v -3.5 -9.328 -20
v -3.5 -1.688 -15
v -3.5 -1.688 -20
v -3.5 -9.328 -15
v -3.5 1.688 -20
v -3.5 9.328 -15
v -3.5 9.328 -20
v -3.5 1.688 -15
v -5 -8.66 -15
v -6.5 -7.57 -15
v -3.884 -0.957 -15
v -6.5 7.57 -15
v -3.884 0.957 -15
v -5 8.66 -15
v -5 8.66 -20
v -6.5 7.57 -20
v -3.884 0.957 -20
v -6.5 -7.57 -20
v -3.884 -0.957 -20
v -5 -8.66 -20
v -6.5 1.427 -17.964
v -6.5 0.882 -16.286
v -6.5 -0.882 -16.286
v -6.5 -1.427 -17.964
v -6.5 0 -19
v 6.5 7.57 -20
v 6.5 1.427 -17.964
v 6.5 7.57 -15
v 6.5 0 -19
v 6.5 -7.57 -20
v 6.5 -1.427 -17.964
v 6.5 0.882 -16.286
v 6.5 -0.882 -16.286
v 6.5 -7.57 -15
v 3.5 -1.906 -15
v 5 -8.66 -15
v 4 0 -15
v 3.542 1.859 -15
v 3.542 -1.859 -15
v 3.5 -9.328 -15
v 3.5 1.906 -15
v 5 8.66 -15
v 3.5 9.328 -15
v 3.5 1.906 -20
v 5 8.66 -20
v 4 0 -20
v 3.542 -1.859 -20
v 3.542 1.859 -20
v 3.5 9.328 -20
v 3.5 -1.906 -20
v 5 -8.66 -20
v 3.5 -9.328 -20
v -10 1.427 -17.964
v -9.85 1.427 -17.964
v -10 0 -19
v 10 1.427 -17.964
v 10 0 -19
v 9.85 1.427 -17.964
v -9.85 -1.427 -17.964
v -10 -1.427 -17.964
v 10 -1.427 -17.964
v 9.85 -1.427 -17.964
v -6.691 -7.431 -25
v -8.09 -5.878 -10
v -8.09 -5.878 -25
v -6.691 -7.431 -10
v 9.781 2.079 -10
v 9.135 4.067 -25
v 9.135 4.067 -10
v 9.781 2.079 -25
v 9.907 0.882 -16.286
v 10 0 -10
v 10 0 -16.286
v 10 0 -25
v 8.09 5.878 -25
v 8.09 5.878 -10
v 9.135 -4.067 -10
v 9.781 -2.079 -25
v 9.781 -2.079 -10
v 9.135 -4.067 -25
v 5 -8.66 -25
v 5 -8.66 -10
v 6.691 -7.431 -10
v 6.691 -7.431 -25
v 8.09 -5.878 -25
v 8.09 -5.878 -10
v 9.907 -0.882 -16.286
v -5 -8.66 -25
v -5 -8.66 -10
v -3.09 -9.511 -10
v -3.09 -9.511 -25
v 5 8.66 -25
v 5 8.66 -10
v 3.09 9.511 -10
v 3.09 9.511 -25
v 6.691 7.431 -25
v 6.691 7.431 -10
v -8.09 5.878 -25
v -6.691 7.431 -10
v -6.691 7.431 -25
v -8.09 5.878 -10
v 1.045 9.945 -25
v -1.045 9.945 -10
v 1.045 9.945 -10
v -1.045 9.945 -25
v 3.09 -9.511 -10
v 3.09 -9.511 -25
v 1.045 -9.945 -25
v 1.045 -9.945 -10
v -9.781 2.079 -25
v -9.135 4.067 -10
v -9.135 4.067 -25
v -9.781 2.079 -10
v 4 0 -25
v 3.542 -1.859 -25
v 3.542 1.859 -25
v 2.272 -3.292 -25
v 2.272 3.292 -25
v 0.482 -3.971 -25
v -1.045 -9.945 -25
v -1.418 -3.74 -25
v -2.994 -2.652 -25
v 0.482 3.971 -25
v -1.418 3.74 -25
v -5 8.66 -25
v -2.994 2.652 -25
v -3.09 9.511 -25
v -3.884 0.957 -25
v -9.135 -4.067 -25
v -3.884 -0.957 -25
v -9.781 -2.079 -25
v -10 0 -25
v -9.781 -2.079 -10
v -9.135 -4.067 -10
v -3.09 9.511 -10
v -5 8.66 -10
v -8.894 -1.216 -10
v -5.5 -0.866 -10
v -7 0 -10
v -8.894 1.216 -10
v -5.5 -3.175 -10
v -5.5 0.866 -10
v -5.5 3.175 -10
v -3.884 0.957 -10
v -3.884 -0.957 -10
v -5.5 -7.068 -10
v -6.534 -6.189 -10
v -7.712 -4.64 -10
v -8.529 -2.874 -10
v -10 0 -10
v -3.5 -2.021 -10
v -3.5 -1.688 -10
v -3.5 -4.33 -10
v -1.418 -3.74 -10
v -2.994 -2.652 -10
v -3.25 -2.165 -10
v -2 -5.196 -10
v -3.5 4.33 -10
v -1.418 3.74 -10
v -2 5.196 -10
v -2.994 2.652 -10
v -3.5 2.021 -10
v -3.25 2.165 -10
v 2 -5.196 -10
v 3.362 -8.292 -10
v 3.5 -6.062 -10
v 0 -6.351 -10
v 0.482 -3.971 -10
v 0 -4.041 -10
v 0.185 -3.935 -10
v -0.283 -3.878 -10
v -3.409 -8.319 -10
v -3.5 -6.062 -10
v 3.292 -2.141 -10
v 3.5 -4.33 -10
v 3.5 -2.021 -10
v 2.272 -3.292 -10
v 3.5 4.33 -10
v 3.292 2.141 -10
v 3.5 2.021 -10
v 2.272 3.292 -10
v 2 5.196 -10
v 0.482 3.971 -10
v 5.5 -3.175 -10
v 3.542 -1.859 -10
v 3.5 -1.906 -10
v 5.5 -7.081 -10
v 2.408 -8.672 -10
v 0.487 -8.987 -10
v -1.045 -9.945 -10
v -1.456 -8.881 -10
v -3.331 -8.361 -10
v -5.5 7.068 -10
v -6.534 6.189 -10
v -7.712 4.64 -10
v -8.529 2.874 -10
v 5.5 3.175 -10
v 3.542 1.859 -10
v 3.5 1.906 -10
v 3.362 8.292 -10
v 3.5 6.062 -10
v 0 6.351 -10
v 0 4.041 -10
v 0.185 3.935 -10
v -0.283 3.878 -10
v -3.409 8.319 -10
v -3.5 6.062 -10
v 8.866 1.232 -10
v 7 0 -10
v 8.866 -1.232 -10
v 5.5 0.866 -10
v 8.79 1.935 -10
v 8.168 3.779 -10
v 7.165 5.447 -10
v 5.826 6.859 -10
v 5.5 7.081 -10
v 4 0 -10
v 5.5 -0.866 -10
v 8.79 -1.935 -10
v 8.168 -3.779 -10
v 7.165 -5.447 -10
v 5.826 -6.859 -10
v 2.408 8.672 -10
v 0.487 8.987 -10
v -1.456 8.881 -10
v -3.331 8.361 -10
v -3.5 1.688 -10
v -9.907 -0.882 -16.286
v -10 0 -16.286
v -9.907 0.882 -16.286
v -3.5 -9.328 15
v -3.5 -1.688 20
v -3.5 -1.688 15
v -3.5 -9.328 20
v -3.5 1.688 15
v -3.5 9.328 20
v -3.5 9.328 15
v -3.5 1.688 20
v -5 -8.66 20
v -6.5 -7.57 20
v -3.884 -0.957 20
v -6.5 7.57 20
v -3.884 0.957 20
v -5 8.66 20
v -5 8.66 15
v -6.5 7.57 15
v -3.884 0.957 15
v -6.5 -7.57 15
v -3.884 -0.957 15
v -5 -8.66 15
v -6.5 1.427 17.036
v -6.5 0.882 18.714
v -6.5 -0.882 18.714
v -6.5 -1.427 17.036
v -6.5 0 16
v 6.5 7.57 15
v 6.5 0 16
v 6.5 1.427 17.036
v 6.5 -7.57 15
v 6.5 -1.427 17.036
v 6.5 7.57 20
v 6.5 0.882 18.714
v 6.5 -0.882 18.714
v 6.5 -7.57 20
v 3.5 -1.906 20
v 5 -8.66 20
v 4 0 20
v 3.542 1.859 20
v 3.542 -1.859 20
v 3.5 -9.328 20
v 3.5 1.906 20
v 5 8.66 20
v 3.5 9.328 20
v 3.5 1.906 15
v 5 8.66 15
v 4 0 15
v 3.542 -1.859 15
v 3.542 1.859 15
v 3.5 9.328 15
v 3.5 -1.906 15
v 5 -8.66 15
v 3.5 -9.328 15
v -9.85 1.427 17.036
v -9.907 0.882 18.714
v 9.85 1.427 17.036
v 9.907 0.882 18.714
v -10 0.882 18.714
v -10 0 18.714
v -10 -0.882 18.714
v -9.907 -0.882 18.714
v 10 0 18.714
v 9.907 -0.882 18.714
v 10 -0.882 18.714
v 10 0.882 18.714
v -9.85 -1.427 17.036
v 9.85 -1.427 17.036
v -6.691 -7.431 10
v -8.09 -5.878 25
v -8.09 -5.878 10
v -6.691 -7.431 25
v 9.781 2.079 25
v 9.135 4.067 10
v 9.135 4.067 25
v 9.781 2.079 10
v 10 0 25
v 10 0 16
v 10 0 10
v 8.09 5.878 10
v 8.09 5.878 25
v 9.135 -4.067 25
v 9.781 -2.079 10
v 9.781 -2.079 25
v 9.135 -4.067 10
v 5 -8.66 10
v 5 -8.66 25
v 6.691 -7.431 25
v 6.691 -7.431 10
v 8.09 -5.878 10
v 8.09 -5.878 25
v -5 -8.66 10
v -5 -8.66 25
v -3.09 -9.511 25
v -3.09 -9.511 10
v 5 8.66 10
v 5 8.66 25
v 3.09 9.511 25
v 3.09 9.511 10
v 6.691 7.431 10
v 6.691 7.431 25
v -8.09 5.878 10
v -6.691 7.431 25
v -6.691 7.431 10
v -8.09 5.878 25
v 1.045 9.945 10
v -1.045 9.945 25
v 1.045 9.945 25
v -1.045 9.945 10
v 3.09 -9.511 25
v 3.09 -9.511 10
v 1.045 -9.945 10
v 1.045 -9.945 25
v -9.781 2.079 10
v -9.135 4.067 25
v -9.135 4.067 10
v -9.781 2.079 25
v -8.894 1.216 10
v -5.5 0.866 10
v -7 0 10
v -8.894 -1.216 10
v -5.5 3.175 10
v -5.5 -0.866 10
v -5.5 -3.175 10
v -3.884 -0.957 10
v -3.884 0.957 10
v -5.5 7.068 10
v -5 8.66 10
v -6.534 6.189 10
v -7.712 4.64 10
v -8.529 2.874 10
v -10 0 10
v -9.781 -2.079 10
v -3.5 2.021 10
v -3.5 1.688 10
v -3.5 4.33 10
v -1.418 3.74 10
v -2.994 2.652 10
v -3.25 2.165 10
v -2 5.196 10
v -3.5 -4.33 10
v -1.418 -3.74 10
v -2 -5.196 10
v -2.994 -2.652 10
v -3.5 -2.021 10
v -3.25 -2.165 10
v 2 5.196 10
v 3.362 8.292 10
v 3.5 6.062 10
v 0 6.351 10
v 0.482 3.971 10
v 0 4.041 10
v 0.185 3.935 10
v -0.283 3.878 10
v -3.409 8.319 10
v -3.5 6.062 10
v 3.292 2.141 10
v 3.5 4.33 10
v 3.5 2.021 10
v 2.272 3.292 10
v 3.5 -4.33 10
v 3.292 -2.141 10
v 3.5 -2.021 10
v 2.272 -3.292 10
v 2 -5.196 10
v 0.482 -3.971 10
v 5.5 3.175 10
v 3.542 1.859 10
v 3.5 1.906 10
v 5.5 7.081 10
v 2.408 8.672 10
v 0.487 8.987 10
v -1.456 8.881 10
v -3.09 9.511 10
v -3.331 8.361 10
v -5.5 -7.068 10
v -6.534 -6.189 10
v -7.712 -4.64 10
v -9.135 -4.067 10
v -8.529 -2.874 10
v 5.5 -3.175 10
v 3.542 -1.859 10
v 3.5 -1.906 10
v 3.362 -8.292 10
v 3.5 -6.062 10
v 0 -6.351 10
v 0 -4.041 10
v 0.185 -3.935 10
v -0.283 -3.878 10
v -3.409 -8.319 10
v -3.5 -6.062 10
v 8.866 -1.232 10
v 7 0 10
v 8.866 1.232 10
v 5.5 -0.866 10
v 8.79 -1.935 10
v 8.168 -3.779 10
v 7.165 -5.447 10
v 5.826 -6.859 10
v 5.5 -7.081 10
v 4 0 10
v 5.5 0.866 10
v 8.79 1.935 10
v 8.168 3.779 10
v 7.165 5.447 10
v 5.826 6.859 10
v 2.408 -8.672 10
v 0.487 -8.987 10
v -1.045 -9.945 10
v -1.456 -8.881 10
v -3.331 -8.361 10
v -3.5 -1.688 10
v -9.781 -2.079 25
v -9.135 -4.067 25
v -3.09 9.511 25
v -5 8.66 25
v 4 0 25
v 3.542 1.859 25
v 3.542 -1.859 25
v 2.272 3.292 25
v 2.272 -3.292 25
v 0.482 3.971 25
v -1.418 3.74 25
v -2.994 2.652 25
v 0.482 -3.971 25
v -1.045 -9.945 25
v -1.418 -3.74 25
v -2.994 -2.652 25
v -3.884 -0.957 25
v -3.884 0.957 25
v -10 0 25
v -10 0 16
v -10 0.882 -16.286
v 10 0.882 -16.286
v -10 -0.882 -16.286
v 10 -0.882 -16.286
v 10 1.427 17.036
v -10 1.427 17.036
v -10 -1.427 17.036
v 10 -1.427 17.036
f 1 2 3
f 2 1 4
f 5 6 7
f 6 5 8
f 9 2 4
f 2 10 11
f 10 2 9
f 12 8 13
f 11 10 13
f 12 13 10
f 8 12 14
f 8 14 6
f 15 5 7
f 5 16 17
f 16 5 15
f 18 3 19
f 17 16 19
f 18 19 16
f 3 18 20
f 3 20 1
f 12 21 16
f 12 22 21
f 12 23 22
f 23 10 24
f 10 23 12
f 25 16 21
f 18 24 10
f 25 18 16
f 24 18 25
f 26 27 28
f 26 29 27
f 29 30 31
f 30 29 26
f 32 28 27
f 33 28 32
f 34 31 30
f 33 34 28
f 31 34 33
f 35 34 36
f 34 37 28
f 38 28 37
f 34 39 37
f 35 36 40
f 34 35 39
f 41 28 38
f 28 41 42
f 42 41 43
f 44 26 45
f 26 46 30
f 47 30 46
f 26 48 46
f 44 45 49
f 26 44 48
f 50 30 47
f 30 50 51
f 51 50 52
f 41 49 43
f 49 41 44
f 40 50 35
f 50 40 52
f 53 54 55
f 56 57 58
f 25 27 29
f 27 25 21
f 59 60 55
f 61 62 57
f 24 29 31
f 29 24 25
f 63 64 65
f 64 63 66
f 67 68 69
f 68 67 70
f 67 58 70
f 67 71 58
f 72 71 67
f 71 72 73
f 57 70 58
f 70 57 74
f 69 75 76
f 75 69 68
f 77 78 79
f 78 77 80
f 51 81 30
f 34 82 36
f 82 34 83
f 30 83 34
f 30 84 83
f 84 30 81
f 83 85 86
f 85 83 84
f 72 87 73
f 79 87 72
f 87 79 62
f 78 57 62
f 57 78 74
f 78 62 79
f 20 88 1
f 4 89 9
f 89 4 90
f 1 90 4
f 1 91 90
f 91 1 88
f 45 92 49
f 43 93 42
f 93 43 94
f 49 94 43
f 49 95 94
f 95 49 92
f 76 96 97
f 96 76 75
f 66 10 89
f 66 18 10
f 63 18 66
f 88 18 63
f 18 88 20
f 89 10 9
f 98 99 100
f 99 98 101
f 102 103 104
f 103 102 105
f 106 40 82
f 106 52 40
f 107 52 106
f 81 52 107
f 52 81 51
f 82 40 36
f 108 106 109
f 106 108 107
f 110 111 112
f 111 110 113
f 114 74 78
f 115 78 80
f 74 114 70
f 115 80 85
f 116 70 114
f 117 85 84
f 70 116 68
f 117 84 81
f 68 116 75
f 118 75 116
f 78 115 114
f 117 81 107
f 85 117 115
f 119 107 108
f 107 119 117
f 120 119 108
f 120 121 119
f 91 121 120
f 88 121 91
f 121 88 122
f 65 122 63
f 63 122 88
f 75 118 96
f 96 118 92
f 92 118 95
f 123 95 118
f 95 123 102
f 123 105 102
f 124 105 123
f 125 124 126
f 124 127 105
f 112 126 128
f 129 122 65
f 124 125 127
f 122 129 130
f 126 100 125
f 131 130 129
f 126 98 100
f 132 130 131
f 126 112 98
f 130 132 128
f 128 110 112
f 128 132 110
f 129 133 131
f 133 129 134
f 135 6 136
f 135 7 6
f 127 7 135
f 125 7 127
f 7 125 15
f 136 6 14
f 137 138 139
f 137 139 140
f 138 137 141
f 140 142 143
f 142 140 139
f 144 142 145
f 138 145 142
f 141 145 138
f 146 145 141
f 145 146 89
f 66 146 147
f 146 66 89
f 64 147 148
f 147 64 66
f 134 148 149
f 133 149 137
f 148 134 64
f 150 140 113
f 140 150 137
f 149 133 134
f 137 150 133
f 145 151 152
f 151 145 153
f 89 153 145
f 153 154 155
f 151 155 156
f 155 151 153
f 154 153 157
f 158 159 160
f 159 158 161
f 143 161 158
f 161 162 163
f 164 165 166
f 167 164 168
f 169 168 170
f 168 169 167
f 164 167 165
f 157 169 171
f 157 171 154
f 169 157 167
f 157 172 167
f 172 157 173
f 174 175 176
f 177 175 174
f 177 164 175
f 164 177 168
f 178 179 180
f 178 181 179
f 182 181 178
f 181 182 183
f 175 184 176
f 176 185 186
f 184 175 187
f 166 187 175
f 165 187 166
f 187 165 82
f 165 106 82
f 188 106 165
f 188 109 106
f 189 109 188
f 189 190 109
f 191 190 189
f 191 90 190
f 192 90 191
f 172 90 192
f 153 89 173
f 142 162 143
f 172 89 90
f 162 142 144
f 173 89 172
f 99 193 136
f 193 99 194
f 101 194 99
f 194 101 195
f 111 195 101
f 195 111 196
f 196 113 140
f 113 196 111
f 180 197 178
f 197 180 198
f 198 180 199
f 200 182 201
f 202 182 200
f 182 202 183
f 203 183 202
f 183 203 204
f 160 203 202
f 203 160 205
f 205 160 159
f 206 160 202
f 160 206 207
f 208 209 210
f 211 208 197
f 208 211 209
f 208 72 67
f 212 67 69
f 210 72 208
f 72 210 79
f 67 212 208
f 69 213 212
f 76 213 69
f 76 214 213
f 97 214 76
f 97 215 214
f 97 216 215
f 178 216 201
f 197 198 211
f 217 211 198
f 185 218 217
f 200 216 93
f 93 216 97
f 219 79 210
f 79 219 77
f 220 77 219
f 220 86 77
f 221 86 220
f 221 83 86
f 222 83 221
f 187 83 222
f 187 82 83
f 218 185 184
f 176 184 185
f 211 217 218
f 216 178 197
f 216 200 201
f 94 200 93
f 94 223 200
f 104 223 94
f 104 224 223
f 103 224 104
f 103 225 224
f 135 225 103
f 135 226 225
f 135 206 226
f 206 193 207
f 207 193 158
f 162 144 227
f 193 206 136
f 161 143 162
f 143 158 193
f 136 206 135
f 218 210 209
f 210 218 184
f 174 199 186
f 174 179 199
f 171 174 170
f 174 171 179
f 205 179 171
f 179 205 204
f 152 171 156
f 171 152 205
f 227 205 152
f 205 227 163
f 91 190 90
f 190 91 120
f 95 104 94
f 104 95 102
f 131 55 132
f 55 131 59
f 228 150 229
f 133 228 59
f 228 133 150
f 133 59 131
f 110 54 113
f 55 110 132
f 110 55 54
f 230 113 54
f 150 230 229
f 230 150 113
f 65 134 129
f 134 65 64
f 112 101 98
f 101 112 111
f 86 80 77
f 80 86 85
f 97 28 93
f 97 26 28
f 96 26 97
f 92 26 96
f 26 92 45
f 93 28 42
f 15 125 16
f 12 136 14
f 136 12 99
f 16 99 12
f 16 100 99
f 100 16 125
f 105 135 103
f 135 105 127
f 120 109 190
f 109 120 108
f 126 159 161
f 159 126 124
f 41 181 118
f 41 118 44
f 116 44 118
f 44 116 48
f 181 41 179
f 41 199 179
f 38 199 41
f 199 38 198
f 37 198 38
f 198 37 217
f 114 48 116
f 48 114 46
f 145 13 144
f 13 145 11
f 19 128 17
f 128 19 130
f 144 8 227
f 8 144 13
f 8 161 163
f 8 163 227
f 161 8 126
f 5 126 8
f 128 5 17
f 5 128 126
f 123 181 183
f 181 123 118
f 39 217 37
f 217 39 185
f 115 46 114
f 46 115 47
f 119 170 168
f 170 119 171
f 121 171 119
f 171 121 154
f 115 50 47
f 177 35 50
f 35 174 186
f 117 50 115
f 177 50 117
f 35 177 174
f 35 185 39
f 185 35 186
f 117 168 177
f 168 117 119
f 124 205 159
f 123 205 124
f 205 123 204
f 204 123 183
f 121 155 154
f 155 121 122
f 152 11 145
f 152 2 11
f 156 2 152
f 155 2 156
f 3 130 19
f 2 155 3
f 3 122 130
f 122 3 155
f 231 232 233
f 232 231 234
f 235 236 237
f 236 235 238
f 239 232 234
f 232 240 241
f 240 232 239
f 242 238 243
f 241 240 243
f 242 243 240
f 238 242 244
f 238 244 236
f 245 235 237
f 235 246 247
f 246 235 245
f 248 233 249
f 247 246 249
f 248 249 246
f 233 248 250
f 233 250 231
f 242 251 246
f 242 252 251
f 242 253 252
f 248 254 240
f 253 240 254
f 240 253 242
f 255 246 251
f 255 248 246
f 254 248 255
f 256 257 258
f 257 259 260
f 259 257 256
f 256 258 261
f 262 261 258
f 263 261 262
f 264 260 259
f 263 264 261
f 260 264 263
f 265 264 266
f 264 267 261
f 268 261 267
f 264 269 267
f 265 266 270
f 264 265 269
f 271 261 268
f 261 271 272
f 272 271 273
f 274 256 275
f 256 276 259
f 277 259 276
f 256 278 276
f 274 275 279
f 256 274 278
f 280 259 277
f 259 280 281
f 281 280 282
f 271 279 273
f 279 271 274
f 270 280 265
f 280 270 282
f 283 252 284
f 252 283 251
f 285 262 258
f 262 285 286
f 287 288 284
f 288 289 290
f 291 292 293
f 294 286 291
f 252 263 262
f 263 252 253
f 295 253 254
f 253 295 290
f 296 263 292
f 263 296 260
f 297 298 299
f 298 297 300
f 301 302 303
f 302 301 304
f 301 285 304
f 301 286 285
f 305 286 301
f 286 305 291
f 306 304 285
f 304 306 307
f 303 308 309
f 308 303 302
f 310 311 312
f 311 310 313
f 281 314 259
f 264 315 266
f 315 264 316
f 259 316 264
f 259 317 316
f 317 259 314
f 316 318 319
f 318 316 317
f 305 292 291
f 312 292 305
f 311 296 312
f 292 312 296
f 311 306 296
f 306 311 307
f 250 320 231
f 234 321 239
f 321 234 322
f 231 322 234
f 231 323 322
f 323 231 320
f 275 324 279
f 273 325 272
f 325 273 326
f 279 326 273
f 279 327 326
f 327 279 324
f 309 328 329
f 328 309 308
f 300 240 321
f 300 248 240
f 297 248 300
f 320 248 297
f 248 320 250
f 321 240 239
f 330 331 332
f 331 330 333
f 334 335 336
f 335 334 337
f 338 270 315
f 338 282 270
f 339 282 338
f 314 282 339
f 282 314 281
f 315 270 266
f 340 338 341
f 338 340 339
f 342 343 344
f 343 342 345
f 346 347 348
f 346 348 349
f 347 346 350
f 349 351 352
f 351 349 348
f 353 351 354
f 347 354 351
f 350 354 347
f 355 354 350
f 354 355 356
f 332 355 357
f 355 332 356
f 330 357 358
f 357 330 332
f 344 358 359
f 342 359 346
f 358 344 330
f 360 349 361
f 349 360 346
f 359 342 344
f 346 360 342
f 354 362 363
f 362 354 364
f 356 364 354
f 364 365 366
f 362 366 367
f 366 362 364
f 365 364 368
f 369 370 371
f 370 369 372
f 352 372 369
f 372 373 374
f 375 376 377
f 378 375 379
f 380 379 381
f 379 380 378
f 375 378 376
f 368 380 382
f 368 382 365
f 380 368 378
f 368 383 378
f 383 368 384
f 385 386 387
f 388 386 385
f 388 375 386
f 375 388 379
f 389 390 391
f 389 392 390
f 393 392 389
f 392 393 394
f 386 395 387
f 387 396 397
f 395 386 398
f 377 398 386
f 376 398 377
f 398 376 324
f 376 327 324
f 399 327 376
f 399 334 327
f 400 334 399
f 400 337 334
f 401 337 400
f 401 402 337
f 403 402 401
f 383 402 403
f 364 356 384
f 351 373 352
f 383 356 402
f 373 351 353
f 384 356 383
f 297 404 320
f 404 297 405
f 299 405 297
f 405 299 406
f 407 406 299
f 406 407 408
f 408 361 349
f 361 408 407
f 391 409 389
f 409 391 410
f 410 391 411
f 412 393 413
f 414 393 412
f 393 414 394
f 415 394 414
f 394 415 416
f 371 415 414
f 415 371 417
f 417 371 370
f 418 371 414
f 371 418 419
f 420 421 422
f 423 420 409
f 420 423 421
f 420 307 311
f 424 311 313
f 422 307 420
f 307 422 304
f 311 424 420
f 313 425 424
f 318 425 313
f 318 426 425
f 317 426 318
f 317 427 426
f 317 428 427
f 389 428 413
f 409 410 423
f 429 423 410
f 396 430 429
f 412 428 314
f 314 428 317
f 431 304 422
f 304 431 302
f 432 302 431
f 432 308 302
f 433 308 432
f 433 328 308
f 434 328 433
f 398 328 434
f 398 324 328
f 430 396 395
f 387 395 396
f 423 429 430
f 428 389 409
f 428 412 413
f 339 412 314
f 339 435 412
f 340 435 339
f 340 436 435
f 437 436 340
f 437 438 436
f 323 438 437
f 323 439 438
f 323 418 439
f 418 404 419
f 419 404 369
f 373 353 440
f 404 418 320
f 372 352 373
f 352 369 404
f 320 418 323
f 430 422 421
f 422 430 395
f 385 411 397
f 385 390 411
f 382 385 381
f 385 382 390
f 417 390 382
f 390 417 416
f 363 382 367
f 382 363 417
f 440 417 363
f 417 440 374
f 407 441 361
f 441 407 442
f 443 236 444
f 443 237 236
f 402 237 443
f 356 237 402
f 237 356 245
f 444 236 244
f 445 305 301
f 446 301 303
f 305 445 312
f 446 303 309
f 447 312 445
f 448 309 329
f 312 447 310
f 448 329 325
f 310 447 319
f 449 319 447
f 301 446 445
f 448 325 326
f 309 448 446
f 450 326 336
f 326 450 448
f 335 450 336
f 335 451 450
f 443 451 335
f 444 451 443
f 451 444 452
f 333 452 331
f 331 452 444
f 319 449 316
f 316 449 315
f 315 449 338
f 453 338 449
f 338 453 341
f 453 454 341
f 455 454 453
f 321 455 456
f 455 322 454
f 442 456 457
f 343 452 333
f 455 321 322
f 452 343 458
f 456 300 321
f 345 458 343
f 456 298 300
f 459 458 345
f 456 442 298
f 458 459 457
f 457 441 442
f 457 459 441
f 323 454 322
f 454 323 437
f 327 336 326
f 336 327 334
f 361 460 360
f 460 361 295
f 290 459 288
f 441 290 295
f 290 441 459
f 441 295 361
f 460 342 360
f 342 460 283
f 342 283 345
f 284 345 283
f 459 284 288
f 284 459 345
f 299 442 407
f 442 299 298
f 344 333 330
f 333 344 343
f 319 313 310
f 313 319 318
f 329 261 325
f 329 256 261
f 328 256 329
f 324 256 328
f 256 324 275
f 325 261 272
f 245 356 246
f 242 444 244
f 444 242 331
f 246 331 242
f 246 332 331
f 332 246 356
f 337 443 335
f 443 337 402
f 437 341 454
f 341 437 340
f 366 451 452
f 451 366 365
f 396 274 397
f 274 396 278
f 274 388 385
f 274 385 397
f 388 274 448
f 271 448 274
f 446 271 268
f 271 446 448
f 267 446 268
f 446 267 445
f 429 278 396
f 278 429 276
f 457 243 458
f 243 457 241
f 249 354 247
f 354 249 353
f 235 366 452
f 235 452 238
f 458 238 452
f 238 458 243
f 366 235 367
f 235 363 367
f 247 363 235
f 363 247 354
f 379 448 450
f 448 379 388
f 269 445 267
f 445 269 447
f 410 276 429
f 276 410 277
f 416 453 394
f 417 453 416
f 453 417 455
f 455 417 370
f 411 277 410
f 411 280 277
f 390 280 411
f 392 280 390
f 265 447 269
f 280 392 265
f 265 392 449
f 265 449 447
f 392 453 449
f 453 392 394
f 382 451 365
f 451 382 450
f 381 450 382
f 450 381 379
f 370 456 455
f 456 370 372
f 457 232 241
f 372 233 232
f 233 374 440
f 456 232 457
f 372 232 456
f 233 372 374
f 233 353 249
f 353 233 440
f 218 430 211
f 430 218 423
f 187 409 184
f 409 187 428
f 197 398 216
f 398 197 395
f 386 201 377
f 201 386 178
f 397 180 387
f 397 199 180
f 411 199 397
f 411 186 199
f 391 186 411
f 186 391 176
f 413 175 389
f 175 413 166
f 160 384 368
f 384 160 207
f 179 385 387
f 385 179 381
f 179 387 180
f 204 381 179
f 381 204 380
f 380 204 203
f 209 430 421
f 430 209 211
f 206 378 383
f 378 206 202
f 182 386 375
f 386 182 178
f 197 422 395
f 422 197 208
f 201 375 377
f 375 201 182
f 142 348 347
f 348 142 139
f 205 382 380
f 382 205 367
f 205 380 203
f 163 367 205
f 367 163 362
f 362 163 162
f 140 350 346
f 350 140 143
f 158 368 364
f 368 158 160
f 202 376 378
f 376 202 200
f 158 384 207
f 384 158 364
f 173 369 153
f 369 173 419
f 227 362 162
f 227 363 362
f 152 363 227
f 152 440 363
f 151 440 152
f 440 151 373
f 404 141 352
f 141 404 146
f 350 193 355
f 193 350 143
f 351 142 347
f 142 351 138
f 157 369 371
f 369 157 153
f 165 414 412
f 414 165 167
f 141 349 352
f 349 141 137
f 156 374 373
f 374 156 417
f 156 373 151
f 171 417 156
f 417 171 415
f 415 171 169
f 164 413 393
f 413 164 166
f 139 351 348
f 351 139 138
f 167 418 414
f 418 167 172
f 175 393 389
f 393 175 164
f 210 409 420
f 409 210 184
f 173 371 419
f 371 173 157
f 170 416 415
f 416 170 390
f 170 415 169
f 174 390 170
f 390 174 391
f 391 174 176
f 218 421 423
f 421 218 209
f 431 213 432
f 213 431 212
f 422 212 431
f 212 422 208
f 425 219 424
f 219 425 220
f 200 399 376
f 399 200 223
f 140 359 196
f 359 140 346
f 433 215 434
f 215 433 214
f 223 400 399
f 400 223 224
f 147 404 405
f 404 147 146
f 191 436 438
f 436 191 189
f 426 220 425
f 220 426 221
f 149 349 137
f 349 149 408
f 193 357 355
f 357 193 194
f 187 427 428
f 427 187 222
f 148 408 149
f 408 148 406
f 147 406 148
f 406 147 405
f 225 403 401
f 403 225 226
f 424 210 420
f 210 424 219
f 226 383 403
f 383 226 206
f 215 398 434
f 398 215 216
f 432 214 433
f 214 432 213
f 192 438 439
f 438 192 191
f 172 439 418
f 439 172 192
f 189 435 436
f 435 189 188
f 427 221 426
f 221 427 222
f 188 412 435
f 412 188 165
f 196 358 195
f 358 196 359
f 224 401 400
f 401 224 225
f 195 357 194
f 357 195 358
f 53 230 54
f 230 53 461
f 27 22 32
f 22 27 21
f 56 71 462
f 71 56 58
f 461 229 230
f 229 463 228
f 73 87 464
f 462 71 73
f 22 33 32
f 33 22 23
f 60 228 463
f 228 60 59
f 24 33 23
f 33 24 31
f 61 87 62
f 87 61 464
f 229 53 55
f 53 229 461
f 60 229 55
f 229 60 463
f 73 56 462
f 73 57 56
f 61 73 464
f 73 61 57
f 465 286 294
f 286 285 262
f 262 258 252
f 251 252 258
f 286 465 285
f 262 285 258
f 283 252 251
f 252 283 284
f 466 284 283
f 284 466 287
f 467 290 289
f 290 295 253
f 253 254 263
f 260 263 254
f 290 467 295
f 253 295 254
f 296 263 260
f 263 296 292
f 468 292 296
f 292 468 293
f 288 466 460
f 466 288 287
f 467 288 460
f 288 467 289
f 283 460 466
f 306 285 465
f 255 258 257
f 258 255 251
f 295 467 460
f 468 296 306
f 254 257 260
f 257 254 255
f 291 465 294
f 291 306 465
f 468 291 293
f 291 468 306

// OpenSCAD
// Parameters
hub_diameter = 20;
hub_length = 15;
bore_diameter = 8;
slot_width = 2;
slot_depth = 8;
fastener_diameter = 3;
fastener_length = 10;
flexible_element_length = 20;
flexible_element_diameter = 18;
slot_count = 6;
clamping_slot_depth = 5; // Adjusted slot depth for clamping hubs
clamping_slot_width = 3; // Adjusted slot width for clamping hubs

// Clamping Hub Module
module clamping_hub() {
    difference() {
        // Main cylindrical hub (more solid structure)
        cylinder(h = hub_length, d = hub_diameter, center = true);
        
        // Central bore
        cylinder(h = hub_length + 2, d = bore_diameter, center = true);
        
        // Clamping slots (adjusted to be more refined)
        for (i = [-1, 1]) {
            translate([i * hub_diameter / 4, 0, 0])
                cube([clamping_slot_width, hub_diameter, clamping_slot_depth], center = true);
        }
        
        // Fastener holes (aligned properly)
        for (i = [-1, 1]) {
            translate([i * hub_diameter / 4, 0, 0])
                rotate([0, 90, 0])
                cylinder(h = hub_diameter + 2, d = fastener_diameter, center = true);
        }
    }
}

// Flexible Element Module
module flexible_element() {
    difference() {
        // Main cylindrical body
        cylinder(h = flexible_element_length, d = flexible_element_diameter, center = true);
        
        // Slotted cuts for flexibility (adjusted to be evenly spaced and simpler)
        for (i = [0:slot_count-1]) {
            rotate([0, 0, i * (360 / slot_count)])
                translate([flexible_element_diameter / 4, 0, 0])
                cube([slot_width, flexible_element_diameter, flexible_element_length], center = true);
        }
    }
}

// Fastener Module
module fastener() {
    cylinder(h = fastener_length, d = fastener_diameter, center = true);
}

// Assembly
module flexible_coupling() {
    // Clamping Hub 1
    translate([0, 0, -flexible_element_length / 2 - hub_length / 2])
        clamping_hub();
    
    // Clamping Hub 2
    translate([0, 0, flexible_element_length / 2 + hub_length / 2])
        clamping_hub();
    
    // Flexible Element
    flexible_element();
    
    // Fasteners for Clamping Hub 1 (repositioned correctly)
    for (i = [-1, 1]) {
        translate([i * hub_diameter / 4, 0, -flexible_element_length / 2 - hub_length / 2])
            rotate([0, 90, 0])
            fastener();
    }
    
    // Fasteners for Clamping Hub 2 (repositioned correctly)
    for (i = [-1, 1]) {
        translate([i * hub_diameter / 4, 0, flexible_element_length / 2 + hub_length / 2])
            rotate([0, 90, 0])
            fastener();
    }
}

// Render the complete assembly
flexible_coupling();
